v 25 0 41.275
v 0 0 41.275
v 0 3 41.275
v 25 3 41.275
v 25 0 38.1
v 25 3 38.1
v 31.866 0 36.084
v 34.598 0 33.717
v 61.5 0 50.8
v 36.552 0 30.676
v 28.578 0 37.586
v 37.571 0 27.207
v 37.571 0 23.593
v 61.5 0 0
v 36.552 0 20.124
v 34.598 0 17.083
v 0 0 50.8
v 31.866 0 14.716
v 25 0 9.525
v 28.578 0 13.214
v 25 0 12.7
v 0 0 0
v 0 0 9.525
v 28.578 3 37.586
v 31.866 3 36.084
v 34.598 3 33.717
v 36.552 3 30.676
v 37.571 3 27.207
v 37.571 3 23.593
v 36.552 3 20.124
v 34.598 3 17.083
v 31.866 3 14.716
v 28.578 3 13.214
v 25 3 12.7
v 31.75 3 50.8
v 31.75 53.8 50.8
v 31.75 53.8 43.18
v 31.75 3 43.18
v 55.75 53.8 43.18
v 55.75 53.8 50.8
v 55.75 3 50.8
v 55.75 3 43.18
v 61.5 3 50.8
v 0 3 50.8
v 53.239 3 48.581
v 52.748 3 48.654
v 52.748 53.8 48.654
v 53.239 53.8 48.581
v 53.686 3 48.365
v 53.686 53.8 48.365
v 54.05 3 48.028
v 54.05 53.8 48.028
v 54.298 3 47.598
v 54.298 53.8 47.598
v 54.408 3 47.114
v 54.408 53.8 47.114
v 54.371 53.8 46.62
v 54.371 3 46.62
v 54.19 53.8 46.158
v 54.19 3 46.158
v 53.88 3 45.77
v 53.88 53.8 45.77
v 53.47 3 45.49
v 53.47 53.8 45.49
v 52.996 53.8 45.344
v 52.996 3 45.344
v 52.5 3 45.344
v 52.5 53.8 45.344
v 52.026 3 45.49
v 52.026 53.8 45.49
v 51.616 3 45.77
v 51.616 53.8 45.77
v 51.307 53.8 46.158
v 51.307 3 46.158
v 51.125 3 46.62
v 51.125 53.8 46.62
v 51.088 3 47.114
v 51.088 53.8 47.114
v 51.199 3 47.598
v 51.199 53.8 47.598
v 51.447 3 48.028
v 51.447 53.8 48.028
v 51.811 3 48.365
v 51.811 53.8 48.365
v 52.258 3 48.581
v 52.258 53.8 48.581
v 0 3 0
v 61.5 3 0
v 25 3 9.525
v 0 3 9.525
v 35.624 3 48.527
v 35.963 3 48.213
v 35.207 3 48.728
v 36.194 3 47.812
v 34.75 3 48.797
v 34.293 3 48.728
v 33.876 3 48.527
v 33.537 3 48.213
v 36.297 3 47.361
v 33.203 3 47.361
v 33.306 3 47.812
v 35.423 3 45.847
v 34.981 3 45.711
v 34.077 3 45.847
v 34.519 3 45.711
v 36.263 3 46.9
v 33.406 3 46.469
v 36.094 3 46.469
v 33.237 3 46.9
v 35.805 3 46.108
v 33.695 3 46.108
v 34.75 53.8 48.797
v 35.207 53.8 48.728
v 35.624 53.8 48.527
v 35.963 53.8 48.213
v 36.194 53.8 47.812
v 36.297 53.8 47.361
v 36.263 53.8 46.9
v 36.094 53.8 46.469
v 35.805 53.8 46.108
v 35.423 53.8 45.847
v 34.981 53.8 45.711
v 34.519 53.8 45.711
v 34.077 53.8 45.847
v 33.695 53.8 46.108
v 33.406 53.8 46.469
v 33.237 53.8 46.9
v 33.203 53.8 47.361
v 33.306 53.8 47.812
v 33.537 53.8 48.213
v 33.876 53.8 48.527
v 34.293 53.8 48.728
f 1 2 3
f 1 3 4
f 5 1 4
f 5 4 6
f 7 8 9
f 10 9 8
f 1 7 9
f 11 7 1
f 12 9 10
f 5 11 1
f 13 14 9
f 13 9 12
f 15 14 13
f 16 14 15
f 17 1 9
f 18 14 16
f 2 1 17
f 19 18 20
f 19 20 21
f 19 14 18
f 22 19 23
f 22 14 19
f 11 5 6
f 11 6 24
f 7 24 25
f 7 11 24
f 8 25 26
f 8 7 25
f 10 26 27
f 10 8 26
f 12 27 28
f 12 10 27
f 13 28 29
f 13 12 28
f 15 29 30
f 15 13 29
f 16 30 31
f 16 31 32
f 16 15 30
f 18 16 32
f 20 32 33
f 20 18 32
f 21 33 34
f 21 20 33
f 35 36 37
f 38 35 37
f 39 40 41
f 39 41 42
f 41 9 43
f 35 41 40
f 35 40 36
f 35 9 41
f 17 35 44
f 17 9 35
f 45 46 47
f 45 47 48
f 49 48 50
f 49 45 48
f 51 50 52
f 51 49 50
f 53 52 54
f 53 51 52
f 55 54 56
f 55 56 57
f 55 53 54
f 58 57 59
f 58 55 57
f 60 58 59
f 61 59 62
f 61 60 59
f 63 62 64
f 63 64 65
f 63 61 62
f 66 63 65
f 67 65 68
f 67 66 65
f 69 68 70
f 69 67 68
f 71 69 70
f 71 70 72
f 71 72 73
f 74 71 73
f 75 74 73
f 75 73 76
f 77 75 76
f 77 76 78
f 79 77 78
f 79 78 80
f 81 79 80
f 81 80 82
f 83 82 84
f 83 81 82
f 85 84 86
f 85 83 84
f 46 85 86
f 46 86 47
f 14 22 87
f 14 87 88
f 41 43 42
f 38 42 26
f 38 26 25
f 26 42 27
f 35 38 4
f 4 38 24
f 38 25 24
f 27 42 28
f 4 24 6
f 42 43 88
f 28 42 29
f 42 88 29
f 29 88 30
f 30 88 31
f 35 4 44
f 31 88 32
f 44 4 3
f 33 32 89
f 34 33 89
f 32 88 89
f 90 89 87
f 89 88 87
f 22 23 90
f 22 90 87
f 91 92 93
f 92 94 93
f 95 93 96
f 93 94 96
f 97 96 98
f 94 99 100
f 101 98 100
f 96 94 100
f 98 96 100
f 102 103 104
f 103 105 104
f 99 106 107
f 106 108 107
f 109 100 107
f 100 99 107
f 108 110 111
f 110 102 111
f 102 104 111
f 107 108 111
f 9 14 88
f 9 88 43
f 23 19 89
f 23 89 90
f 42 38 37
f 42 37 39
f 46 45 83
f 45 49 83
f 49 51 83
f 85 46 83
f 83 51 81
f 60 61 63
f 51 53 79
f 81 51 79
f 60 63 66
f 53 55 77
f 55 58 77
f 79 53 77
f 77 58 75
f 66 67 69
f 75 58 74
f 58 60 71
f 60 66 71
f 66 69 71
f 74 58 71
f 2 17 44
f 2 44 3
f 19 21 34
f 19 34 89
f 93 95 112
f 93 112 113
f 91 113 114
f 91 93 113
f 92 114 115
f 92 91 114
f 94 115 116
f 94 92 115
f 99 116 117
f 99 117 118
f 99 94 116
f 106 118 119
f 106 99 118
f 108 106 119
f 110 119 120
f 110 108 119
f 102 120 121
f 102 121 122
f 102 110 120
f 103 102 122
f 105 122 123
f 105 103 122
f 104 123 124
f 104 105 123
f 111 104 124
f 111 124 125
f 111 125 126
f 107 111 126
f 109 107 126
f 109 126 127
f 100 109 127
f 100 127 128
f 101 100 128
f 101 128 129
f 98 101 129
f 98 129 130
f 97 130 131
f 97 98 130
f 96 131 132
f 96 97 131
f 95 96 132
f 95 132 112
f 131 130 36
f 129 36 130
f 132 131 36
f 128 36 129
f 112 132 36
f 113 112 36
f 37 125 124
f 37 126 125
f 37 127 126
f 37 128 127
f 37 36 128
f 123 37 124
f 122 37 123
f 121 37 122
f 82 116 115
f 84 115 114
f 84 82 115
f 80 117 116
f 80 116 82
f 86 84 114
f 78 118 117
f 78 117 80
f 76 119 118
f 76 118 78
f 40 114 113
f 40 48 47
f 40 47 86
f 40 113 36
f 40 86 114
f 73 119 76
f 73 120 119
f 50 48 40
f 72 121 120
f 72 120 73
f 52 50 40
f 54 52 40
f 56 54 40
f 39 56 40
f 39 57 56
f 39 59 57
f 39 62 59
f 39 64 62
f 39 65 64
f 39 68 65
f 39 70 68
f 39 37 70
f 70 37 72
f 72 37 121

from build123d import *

# Parameters (mm, degrees)
BOSS_EXTRUDE1_DEPTH = 3
SKETCH2_W           = 24
SKETCH2_H           = 7.62
SKETCH2_R           = 1.551597038
SKETCH2_R_2         = 1.664454239
BOSS_EXTRUDE2_DEPTH = 50.8


with BuildPart() as part:
    # Sketch1 → Boss-Extrude1 (new body)
    with BuildSketch(Plane(origin=(0, 0, 0), x_dir=(1, 0, 0), z_dir=(0, 1, 0))):
        with BuildLine():
            Line((0, 0), (61.5, 0))
            Line((61.5, 0), (61.5, -50.8))
            Line((61.5, -50.8), (0, -50.8))
            Line((0, -50.8), (0, -41.275))
            Line((0, -41.275), (25, -41.275))
            Line((25, -41.275), (25, -38.1))
            ThreePointArc((25, -38.1), (37.7, -25.4), (25, -12.7))
            Line((25, -12.7), (25, -9.525))
            Line((25, -9.525), (0, -9.525))
            Line((0, -9.525), (0, 0))
        make_face()
    extrude(amount=BOSS_EXTRUDE1_DEPTH)

    # Sketch2 → Boss-Extrude2 (add)
    with BuildSketch(Plane(origin=(0, 3, 0), x_dir=(1, 0, 0), z_dir=(0, 1, 0))):
        with Locations((43.75, -46.99)):
            Rectangle(SKETCH2_W, SKETCH2_H)
        with Locations(Location((34.75, -47.245142262, 0), (0, 0, 270))):
            Circle(SKETCH2_R, mode=Mode.SUBTRACT)
        with Locations(Location((52.748191643, -46.99, 0), (0, 0, 270))):
            Circle(SKETCH2_R_2, mode=Mode.SUBTRACT)
    extrude(amount=BOSS_EXTRUDE2_DEPTH)


solid = part.part
